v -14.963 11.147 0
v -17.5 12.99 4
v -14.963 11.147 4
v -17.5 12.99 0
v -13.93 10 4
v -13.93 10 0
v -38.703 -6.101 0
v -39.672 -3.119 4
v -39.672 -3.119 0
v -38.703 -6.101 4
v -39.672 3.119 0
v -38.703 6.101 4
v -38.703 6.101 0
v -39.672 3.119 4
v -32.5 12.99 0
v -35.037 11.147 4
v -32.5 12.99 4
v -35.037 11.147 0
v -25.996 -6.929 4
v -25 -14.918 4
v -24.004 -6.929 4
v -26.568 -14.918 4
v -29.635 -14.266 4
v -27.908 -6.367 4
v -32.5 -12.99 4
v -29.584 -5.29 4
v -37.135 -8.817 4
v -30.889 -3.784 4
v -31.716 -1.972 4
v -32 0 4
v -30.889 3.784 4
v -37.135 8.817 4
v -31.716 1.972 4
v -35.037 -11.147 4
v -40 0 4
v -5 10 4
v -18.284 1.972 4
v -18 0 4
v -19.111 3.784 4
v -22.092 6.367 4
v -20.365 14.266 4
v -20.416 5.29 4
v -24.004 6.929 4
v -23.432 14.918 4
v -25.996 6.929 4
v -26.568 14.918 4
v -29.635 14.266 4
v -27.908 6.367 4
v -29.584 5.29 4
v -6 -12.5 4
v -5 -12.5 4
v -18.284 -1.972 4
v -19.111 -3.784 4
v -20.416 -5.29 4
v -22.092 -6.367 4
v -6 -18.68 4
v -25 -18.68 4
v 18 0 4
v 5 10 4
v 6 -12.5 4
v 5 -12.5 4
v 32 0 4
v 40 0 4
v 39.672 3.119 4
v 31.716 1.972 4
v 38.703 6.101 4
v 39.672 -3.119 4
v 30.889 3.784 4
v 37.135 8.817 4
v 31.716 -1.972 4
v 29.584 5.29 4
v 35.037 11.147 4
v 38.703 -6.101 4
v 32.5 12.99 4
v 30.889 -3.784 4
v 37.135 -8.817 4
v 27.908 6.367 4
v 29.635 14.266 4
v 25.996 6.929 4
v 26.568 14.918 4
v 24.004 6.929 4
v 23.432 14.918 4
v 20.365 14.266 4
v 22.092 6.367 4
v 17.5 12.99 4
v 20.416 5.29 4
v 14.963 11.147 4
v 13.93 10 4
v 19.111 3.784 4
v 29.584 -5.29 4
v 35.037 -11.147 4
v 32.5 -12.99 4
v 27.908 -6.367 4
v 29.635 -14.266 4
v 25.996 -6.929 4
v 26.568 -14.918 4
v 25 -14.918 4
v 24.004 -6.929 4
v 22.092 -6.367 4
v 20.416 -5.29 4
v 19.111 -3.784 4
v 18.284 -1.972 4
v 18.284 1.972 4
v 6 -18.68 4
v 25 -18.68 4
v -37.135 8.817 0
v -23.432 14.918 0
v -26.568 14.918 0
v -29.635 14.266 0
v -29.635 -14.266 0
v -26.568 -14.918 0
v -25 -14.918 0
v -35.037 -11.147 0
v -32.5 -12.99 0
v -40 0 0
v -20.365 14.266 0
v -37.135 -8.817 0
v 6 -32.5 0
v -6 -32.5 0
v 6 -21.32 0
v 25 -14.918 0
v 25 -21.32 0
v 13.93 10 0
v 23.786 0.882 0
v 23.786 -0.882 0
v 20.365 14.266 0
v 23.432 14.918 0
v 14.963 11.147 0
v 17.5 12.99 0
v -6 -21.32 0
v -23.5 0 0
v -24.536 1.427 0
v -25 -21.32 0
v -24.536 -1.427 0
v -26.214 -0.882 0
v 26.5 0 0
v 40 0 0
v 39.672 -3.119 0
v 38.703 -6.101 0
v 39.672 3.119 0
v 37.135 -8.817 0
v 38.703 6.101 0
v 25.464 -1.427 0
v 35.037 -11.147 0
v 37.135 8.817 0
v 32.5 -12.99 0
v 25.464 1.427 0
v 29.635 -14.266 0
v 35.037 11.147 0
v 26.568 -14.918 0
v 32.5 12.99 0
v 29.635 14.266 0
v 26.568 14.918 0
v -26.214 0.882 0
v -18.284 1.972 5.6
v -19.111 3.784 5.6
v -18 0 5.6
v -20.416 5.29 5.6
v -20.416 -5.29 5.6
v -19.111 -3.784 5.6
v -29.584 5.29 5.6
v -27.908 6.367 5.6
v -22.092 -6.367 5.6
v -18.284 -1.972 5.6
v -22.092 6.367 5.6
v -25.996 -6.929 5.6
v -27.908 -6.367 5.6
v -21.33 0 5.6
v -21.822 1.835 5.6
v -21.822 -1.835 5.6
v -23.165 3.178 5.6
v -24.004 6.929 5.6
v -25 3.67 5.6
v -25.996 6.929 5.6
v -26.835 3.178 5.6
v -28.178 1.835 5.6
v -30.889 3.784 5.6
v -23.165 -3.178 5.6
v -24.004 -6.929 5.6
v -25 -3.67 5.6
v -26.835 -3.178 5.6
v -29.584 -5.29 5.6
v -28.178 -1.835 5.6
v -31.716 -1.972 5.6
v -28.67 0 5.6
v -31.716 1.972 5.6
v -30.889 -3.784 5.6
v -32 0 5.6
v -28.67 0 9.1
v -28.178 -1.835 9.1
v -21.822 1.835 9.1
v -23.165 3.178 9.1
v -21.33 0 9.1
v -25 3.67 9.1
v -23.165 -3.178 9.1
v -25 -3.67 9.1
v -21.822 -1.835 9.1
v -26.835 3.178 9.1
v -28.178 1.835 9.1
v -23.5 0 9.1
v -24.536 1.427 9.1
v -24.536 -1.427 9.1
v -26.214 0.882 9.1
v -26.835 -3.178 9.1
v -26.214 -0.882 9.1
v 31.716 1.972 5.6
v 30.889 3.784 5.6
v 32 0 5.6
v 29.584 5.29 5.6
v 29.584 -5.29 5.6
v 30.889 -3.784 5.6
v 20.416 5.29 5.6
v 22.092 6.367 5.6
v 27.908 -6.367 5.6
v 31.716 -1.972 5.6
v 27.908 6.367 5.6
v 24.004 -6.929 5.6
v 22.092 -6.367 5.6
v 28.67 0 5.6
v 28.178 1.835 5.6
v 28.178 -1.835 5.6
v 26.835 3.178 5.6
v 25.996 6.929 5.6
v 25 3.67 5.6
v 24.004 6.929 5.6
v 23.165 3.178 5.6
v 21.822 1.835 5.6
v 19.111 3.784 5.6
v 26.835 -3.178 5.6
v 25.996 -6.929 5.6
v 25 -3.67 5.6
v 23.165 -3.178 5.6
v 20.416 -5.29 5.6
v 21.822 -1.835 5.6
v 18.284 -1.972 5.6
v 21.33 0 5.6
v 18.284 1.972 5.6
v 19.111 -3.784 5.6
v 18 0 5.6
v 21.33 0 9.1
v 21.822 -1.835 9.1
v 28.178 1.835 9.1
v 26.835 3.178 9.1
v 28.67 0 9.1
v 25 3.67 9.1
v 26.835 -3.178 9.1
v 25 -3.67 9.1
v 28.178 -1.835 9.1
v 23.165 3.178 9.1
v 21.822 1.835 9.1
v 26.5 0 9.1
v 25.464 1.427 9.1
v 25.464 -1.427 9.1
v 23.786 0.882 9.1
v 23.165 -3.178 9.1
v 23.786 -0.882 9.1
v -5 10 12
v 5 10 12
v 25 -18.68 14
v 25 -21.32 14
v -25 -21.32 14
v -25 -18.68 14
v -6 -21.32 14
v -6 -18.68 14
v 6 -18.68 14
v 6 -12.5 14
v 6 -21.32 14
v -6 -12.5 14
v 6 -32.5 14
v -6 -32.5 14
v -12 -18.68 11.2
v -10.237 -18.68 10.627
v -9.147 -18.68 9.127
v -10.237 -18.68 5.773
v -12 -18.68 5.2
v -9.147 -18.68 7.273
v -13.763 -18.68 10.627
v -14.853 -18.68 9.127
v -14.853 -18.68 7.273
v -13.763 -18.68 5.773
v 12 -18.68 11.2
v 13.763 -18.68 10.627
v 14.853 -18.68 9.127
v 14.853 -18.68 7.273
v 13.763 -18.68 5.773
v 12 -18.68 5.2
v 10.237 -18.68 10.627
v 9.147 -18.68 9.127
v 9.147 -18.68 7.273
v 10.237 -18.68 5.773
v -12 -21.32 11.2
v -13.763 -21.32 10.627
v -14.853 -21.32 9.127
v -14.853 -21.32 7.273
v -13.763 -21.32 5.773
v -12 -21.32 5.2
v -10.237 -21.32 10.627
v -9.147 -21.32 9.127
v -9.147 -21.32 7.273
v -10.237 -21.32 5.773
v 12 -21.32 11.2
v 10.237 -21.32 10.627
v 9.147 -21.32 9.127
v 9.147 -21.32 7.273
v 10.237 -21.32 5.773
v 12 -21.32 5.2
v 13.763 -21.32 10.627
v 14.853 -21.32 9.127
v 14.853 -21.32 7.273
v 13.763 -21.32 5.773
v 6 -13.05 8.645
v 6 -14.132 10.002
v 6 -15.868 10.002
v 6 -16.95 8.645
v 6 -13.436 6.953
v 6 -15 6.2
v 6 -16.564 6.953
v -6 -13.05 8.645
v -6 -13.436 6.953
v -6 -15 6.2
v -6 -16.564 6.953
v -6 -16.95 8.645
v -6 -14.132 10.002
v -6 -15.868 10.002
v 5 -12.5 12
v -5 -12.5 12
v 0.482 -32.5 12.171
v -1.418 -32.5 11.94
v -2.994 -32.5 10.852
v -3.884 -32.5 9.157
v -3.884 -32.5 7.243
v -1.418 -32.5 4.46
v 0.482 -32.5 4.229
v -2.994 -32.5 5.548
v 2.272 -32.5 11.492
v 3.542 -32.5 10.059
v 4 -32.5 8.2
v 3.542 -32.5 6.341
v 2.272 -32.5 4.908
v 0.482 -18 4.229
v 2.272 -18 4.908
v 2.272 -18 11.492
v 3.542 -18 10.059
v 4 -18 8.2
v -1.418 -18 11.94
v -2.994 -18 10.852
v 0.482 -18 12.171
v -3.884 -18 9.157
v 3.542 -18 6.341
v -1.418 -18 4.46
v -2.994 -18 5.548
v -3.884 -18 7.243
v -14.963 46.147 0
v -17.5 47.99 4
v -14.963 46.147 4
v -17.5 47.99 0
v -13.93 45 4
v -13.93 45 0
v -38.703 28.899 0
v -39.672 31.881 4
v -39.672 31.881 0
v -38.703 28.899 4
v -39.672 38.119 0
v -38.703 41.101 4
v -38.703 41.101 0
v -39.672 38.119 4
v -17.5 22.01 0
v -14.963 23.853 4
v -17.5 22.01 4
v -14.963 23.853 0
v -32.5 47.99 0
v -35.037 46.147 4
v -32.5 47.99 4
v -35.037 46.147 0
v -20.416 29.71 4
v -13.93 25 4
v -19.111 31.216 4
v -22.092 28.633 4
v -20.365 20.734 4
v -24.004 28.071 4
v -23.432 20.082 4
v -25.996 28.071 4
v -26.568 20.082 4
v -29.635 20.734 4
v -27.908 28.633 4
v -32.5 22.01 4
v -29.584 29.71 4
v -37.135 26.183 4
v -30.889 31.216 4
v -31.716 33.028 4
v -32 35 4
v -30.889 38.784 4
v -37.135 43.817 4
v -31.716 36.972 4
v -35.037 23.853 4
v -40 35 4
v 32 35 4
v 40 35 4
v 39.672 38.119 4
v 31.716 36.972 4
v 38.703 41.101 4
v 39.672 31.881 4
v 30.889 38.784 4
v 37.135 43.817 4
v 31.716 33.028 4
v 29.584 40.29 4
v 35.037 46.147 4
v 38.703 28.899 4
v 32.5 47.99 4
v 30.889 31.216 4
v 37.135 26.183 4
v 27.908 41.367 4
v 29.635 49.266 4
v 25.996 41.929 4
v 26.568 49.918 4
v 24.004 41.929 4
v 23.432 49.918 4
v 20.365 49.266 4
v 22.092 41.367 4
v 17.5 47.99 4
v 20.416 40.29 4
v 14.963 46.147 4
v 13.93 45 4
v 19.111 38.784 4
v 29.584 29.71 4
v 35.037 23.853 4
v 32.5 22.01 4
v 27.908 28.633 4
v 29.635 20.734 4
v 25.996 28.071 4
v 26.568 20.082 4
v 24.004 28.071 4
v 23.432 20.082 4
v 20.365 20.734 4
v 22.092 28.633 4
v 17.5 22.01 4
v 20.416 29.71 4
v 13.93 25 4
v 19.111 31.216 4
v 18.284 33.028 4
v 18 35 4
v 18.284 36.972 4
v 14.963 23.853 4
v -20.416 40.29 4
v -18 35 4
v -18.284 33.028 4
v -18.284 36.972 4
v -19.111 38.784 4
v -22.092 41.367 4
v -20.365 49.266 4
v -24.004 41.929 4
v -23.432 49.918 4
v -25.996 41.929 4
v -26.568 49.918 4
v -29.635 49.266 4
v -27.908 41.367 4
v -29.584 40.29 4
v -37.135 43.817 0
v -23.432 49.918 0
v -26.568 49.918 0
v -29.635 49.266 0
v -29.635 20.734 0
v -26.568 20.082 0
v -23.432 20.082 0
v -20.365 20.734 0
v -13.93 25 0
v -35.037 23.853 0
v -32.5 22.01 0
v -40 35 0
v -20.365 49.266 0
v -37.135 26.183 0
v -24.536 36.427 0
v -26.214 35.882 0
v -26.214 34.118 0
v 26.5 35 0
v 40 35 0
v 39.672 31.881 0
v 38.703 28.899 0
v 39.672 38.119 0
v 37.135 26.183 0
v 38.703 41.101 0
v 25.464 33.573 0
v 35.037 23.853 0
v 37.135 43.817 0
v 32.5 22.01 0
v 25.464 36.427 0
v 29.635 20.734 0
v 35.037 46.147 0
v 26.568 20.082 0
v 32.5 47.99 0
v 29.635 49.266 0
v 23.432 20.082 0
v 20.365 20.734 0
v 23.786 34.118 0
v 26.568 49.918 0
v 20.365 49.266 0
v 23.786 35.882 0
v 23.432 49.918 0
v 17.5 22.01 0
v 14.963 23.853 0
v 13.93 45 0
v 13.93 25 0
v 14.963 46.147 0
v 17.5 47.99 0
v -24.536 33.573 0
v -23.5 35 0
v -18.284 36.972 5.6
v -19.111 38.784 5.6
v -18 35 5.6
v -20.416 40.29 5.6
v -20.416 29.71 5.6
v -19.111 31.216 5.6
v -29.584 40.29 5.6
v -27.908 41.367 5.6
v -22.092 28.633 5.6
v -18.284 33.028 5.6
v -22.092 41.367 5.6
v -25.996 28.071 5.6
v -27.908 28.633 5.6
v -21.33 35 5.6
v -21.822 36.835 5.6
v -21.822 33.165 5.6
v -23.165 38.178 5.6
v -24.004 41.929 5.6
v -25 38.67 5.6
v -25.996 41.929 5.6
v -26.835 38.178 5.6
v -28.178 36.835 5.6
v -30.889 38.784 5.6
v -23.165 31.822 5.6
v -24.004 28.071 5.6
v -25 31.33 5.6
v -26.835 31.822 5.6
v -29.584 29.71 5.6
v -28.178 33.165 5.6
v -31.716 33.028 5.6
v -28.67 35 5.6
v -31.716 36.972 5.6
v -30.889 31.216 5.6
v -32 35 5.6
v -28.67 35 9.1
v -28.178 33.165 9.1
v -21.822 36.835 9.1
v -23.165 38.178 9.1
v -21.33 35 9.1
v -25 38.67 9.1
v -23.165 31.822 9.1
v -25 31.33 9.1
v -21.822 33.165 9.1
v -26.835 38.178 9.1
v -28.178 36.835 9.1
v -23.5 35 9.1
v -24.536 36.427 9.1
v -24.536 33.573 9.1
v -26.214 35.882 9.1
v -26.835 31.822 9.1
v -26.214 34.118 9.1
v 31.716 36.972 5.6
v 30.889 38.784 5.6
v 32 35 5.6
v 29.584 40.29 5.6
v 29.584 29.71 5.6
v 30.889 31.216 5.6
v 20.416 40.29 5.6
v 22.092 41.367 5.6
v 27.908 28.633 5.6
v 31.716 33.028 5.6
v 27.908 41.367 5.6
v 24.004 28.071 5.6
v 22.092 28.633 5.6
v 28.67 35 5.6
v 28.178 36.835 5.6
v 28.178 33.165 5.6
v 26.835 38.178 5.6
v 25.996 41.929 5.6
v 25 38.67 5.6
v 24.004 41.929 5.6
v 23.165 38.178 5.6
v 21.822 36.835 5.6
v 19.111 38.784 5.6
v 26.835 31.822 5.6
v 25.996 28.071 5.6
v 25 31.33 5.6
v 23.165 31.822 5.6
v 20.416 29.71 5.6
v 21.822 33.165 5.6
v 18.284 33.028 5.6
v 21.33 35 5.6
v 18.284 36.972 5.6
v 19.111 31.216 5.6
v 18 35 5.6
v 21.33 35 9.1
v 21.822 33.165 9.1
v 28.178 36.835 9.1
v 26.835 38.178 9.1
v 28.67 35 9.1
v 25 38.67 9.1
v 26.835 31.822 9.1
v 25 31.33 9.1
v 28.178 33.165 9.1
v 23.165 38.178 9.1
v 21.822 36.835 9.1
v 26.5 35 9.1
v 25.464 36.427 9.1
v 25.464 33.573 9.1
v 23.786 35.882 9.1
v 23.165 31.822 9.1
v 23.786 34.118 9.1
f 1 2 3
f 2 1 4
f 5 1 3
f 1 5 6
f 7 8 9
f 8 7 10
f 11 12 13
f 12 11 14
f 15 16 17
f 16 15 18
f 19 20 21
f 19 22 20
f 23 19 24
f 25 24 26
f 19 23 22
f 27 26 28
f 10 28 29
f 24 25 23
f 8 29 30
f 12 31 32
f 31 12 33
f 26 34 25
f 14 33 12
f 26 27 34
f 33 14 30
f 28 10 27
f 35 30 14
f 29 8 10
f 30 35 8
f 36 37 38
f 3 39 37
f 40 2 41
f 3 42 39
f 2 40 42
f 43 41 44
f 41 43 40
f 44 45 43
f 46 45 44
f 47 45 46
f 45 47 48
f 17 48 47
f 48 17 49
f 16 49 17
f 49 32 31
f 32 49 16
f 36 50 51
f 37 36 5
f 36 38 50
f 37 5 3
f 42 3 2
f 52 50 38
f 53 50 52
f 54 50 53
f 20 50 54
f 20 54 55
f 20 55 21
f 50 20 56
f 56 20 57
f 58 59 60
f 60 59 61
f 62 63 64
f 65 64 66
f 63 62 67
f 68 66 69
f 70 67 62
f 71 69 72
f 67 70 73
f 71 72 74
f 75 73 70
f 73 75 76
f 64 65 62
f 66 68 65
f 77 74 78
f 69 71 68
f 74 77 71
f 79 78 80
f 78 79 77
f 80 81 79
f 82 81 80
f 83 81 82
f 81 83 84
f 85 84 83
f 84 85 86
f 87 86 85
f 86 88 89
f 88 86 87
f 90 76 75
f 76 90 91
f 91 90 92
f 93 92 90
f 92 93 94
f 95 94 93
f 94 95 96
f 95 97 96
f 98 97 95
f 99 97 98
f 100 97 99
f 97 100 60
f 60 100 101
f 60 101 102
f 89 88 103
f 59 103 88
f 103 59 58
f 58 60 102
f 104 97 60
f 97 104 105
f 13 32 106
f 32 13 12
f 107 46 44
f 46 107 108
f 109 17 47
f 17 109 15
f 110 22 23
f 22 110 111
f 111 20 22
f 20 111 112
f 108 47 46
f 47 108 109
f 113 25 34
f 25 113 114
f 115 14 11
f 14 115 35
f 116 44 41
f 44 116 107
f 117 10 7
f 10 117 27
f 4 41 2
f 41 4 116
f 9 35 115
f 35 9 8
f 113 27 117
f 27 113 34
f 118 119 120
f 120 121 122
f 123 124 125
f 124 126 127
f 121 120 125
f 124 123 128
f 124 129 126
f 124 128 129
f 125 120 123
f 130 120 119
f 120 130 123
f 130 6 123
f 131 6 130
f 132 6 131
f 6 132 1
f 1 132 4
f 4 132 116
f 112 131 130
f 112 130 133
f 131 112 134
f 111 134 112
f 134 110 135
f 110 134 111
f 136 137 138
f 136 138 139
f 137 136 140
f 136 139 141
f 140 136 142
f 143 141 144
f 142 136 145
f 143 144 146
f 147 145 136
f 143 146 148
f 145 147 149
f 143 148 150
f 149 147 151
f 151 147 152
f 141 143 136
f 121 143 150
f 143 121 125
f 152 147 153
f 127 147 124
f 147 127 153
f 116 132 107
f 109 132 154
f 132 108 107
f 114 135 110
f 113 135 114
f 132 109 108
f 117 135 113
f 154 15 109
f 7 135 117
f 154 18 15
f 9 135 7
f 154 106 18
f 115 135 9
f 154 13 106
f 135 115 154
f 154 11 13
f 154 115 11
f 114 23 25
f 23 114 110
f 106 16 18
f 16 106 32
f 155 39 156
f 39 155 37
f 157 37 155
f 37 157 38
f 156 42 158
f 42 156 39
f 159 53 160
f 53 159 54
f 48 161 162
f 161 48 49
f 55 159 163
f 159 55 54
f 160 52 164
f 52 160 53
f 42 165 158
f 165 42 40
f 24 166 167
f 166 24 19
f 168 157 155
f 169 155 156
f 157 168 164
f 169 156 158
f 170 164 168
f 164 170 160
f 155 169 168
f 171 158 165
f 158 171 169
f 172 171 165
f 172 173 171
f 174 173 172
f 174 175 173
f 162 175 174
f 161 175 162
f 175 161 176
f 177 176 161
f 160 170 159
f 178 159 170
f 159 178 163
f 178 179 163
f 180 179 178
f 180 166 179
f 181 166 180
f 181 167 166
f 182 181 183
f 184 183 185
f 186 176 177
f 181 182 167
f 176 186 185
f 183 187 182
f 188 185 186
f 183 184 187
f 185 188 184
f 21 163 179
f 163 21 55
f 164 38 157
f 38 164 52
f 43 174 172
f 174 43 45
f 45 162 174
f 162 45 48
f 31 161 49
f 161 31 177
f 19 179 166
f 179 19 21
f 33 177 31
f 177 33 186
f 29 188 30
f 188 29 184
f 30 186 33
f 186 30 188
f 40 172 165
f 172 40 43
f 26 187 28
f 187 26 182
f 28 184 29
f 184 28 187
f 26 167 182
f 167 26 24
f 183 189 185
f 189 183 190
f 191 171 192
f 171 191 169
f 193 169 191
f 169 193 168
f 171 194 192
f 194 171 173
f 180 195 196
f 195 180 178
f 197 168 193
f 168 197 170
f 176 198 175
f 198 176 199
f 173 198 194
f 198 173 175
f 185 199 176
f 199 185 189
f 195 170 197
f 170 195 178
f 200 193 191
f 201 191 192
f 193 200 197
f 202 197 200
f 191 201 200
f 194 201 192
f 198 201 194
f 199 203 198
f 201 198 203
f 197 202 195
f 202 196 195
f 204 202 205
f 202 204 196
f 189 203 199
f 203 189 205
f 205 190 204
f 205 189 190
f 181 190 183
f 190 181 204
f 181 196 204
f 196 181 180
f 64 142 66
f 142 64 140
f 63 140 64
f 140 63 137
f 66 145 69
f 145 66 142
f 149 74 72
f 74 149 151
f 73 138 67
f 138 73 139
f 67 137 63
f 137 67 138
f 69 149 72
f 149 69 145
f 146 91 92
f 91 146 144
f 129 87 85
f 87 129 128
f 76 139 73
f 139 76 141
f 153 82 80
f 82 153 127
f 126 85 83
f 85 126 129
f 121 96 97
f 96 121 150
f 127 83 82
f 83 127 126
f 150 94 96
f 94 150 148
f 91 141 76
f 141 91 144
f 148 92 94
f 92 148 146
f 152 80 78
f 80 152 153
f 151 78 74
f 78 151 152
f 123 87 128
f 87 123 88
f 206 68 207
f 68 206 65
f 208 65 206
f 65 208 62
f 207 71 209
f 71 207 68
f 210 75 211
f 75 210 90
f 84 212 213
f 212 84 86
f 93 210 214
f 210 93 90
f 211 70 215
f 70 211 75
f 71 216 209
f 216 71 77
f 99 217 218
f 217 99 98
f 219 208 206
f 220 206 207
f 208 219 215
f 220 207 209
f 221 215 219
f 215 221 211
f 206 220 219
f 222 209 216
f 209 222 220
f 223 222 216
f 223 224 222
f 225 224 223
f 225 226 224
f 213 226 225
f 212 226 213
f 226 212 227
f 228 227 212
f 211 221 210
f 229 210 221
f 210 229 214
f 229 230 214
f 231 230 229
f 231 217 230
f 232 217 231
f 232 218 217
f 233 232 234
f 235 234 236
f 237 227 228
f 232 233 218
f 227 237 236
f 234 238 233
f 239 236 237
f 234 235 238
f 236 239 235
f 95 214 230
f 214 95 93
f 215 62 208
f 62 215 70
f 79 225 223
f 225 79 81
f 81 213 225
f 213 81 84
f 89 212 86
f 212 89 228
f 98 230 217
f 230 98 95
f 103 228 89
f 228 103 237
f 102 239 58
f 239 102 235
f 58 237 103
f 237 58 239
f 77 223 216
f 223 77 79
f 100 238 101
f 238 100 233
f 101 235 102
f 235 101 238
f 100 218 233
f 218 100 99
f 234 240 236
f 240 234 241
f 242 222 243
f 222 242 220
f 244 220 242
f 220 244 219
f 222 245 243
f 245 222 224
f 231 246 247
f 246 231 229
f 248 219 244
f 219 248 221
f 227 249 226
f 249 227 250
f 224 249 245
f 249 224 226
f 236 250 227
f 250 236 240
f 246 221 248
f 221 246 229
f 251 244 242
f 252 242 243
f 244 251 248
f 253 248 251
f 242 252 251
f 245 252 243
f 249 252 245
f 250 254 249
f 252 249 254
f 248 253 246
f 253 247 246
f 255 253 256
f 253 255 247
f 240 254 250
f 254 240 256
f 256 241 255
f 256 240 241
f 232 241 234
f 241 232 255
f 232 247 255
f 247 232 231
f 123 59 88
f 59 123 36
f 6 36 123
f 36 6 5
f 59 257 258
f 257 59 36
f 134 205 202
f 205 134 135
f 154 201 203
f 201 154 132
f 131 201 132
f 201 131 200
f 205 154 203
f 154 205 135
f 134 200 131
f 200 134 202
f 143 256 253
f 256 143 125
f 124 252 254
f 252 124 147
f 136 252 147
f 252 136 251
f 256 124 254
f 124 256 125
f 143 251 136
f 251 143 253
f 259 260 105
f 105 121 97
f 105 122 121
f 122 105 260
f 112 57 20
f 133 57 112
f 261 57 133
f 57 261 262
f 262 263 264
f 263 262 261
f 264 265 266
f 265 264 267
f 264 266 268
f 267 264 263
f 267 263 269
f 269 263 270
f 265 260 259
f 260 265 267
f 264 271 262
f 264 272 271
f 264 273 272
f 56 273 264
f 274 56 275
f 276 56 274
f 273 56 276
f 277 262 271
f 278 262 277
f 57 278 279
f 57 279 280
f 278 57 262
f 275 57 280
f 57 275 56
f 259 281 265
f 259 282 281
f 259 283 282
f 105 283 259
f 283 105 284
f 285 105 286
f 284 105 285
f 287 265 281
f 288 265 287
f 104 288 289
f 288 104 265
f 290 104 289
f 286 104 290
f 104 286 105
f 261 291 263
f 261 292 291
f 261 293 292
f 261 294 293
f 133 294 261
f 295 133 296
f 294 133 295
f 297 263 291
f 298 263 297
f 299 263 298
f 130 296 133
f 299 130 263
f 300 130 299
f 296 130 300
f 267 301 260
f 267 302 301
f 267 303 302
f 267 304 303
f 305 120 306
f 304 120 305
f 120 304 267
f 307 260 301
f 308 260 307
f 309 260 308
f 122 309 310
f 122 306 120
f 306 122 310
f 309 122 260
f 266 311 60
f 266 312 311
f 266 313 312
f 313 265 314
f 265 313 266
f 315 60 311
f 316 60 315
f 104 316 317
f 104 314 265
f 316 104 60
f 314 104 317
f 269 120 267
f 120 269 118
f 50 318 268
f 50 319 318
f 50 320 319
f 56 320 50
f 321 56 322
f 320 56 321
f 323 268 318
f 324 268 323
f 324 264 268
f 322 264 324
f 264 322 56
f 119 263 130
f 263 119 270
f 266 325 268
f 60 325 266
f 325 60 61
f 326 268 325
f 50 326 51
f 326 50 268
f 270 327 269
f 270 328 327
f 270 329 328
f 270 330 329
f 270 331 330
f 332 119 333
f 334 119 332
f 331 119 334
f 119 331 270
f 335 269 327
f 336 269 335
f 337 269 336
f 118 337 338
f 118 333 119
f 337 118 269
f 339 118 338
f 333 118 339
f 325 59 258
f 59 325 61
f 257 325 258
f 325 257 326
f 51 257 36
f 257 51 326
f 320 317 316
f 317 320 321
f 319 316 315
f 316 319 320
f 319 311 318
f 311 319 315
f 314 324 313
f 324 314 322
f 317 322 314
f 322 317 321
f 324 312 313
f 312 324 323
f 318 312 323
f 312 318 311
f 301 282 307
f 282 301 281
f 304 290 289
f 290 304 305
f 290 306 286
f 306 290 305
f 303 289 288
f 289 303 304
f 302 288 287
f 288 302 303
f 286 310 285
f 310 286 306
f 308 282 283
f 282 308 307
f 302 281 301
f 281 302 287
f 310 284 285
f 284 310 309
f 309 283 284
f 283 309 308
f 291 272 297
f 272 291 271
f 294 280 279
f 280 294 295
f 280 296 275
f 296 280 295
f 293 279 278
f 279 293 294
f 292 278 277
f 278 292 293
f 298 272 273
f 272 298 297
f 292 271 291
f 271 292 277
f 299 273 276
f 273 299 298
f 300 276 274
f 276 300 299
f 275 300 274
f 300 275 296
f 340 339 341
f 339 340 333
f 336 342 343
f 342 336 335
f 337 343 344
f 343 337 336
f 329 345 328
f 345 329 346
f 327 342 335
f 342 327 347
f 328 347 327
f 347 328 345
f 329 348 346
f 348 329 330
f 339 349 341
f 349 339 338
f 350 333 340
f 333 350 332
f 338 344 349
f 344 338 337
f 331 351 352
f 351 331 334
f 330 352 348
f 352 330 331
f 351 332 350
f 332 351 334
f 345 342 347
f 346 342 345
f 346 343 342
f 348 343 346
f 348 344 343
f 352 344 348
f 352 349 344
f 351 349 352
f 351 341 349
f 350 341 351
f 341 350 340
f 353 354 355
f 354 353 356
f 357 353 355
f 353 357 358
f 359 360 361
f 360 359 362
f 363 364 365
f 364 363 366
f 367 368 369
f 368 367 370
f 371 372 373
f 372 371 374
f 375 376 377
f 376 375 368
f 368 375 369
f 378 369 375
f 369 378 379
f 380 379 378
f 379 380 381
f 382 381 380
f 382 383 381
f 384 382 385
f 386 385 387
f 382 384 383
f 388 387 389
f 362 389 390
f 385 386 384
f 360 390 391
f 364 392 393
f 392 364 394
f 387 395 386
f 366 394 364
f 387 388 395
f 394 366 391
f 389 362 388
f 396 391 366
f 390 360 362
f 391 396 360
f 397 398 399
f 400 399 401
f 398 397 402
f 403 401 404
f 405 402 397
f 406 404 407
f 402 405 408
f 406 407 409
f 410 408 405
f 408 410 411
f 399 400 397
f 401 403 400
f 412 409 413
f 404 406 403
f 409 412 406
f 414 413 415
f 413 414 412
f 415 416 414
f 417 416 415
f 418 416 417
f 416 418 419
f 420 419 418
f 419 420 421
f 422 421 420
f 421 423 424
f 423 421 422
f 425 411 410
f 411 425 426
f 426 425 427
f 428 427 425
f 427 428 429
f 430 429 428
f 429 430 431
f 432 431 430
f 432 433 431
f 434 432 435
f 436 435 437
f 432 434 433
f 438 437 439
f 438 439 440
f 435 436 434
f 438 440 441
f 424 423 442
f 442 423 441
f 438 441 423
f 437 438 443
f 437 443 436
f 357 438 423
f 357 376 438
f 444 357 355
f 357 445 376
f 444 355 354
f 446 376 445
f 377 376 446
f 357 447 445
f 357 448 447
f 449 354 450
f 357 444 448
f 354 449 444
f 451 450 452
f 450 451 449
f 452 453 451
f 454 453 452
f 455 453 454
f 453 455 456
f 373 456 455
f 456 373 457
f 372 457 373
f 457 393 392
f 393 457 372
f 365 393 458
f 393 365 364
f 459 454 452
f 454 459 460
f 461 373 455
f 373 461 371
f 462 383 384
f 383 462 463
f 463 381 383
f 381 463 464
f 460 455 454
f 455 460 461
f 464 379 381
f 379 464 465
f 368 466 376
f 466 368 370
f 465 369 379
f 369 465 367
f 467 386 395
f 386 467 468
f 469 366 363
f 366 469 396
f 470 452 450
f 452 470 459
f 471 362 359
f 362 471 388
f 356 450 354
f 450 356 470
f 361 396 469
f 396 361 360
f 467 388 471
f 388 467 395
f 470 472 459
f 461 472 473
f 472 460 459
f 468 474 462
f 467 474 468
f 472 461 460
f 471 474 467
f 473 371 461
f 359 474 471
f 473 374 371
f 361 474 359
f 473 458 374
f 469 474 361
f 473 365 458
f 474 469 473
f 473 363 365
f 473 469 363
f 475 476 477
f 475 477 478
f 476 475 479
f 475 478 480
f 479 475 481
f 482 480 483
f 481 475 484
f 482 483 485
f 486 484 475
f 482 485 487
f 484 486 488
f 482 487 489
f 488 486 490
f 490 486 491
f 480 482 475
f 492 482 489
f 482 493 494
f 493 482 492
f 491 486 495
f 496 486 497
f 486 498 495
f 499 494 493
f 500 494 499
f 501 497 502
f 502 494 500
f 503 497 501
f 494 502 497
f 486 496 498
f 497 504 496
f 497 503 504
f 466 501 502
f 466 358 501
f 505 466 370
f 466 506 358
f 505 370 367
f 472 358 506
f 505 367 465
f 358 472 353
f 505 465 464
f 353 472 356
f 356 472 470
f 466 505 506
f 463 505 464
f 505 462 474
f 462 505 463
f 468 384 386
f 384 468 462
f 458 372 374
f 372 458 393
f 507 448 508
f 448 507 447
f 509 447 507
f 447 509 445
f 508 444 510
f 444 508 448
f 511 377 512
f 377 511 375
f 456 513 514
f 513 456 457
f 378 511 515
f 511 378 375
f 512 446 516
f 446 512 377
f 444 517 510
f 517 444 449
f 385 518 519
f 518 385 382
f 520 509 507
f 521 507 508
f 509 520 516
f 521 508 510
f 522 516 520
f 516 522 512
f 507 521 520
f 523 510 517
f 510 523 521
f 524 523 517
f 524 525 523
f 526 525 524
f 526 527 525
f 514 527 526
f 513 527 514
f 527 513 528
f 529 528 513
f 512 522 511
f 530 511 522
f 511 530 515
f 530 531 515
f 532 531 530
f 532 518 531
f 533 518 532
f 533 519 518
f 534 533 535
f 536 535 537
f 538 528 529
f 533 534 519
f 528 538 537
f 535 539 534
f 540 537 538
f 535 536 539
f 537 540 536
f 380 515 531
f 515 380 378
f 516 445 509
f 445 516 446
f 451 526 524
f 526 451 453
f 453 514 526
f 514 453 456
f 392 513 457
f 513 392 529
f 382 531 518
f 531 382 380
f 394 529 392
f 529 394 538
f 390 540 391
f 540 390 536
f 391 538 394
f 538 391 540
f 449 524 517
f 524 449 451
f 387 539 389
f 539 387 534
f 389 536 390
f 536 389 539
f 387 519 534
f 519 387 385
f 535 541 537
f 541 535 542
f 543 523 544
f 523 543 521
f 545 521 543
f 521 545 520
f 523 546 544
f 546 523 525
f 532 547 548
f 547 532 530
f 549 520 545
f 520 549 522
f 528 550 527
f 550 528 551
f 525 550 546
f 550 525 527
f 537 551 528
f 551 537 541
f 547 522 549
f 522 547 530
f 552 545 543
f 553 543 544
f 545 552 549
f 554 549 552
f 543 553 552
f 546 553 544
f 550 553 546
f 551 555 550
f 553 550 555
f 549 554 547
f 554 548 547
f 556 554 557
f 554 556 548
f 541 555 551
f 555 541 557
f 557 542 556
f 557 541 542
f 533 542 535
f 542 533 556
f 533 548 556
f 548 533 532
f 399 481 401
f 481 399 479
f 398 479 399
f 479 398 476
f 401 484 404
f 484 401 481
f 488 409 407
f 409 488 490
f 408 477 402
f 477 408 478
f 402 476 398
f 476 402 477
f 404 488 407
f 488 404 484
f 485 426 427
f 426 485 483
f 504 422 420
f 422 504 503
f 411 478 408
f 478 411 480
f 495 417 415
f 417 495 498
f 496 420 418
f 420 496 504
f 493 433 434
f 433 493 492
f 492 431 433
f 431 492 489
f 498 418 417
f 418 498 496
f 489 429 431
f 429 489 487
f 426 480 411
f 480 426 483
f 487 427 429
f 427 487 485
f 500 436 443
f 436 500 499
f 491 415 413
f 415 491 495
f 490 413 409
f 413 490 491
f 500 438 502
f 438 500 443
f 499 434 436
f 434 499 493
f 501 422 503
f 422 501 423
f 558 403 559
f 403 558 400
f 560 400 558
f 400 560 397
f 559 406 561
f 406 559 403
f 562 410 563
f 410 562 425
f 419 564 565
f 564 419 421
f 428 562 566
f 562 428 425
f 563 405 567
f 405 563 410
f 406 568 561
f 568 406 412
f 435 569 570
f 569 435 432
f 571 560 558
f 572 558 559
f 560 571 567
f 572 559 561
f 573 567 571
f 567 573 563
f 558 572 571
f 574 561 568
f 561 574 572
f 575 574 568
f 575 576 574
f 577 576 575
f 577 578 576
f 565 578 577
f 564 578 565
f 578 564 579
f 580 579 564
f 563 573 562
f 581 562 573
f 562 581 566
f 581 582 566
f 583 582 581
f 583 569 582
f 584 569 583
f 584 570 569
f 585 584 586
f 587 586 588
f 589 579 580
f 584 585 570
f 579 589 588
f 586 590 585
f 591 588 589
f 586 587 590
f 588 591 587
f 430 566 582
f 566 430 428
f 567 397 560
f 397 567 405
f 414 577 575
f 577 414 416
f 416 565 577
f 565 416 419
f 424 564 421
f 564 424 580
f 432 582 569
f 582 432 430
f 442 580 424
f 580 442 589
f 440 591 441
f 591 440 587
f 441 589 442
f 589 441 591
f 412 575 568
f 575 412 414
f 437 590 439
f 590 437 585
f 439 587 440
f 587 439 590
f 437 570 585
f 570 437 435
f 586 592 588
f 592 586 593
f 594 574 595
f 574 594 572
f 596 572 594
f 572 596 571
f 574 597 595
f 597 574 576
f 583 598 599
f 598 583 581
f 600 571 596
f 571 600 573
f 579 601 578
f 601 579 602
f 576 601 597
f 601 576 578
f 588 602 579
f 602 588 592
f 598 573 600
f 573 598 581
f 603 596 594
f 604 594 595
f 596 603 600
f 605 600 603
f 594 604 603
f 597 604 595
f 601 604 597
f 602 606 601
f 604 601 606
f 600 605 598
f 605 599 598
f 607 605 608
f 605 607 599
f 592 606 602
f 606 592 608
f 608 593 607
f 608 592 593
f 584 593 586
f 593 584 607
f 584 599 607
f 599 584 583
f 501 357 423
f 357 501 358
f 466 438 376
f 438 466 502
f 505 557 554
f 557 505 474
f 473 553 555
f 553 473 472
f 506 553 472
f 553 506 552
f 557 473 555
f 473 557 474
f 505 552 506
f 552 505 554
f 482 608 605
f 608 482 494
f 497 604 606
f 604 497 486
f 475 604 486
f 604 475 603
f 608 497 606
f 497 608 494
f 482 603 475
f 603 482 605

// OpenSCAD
// file: drive-pulley.scad
// Drive pulley
// GNU GPL v3
// Václav 'ax' Hůla <axtheb@gmail.com>
// this is really just string guide with few touches. 
// TODO: refactor

include <configuration.scad>

guide_height = 7;

offset=0.47;

// thickness of the ring in thinnest part
wall_min_thickness = 14 - shaft_radius;
// outer (max) thickness of the ring
wall_max_thickness = wall_min_thickness + offset * guide_height;

module drive_pulley()
{
    difference()
    {
        union(){
            cylinder(r = shaft_radius + wall_min_thickness, h = guide_height);
            cylinder(r1 = shaft_radius + wall_max_thickness, r2 = shaft_radius + wall_min_thickness, h = guide_height * offset);
            translate([0, 0, guide_height * (1 - offset)])
                cylinder(r2 = shaft_radius + wall_max_thickness, r1 = shaft_radius + wall_min_thickness, h = guide_height * offset);
        }
        translate([0, 0, -1])
            cylinder(r = shaft_radius, h = guide_height + 2);  // putting low $fn may be good idea to assure nice press-fit
    }
}

pulley_spacing = 3 + 2 * (shaft_radius + wall_max_thickness);

for(i = [0:1]) {
    translate ([i * pulley_spacing, 0, 0]) drive_pulley();
}
// file: string-guide.scad
// String guide / idler
// GNU GPL v3
// Václav 'ax' Hůla <axtheb@gmail.com>
// Based on Greg Frosts bearing guide and Josef Prusas printable bearing.

include <configuration.scad>

guide_height = 7 + descent_thickness;

// thickness of the ring in thinnest part
wall_min_thickness = single_wall_width * 3;
// outer (max) thickness of the ring
wall_max_thickness = wall_min_thickness + 3;
wall_descent = 1;

module string_guide(offset=0.5)
{
    difference()
    {
        union(){
            cylinder(r1 = bearing_radius + wall_max_thickness, r2 = bearing_radius + wall_min_thickness, h = guide_height * offset);
            translate([0, 0, guide_height * offset])
                cylinder(r2 = bearing_radius + wall_max_thickness, r1 = bearing_radius + wall_min_thickness, h = guide_height * (1 - offset));
        }
        translate([0, 0, -1])
            cylinder(r = bearing_radius, h = guide_height + 2);  // putting low $fn may be good idea to assure nice press-fit
    }

    difference()  // flat part inside
    {
        cylinder(r = bearing_radius, h = descent_thickness);
        translate([0, 0, -1])
            cylinder(r = bearing_radius - wall_descent, h = descent_thickness + 2);
    }

}

guide_spacing = 3 + 2 * (bearing_radius + wall_max_thickness);

// there are two idlers with guide in middle, for far inner corners
for(i = [0:1]) {
    translate ([i * guide_spacing, 0, 0]) string_guide();
}
// three idlers with high guide for left side
for(i = [0:2]) {
    translate([i * guide_spacing, guide_spacing, 0]) string_guide(0.35);
}
// three idlers with low guide for right side
for(i = [0:2]) {
    translate([i * guide_spacing, -guide_spacing, 0]) string_guide(0.65);
}
// file: configuration.scad
// printer properties
layer_height = 0.3;
single_wall_width = layer_height * 2.2;

// bot part properties
bearing_radius = 11;
shaft_radius = 2.5;
descent_thickness = 2 * layer_height;
base_height = 4;

module base_with_holes(r=15) {
    difference() {
        cylinder(h=base_height, r2=15, r1=15 + base_height);
        for (angle = [0:17]) {
            rotate([0, 0, angle*20]) {
                translate([16, 0, -1]) rotate([0, 0, 180]) cylinder(r=1, h=base_height+2);
            }
        }
    }
}

// common funcions here
module bearing_base(holes=false) {
    if (holes) {
        base_with_holes();
    } else {
        cylinder(h=base_height, r=15);
    }
    cylinder(h=base_height + descent_thickness + 1, r=7);
    cylinder(h=base_height + descent_thickness + 4.5, r=(8 - single_wall_width) / 2);
}

module bearing_bed(dist=50, holes=false){
    difference() {
        union() {
            translate([-dist/2,0,0]) {
                bearing_base(holes=holes);
            }
            translate([dist/2,0,0]) {
                bearing_base(holes=holes);
            }
            translate([0, 0, base_height / 2]) cube([30, 20, base_height], center = true);
        }

        translate([-dist/2,0,-1]) cylinder(r=1.5, h=30);
        translate([dist/2,0,-1]) cylinder(r=1.5, h=30);
    }
}
// main file
// Side holder
// GNU GPL v3
// Václav 'ax' Hůla <axtheb@gmail.com>

include <configuration.scad>

use <string-guide.scad>
use <drive-pulley.scad>

%translate ([70, -1, base_height + 0.2])
{
drive_pulley();
// inner wire shadow (that goes to inner far pulley)
translate([0, -14, 4]) rotate([0, 90, 0]) cylinder(r = 0.2, h = 1000, center = true);
// outer wire shadow (which goes around string guide placed in this part and to the carriage
translate([0, 14, 3]) rotate([0, 90, 0]) cylinder(r = 0.2, h = 100, center = true);
}


%translate ([25, 0, base_height + 0.2]) {
string_guide(0.35);
// wire to the carriage
translate([-13, 14 - 50, 4]) rotate([0, 90, 90]) cylinder(r = 0.2, h = 100, center = true);
}

%mirror([1,0,0]) translate ([25, 0, base_height + 0.2]) {
string_guide(0.35);
// wire to the carriage
translate([-13, 14 - 50, 4]) rotate([0, 90, 90]) cylinder(r = 0.2, h = 100, center = true);
}

// distance rod
%translate([0, -518, base_height + 4.2]) rotate([90, 0, 0]) cylinder(r=4, h=1000, center = true);


// *-*-*-*-*-*-*-*-*-*- real part starts here -*-*-*-*-*-*-*-*-*-*

difference() {
    union() {

        // base
        translate([0, -14, base_height / 2]) cube([50, 10, base_height], center = true);
        bearing_bed();

        // face to carriage
        translate([0,-20,5 + base_height / 2]) cube([50, 4 * single_wall_width, 10 + base_height], center = true);

        // this holds distance rod
        translate([0,-22.5,5 + base_height / 2]) cube([12, 20, 10 + base_height], center = true);
        translate([0,-10,4 + base_height / 2]) cube([10, 40, 8 + base_height], center = true);
    }


    union() {
        // passthru wire
        translate([0, -15, base_height + 4.2]) rotate([0, 90, 0]) cylinder(r = 2, h = 100, center = true);
        // wires to carriage
        translate([12, 0, base_height + 4.2]) rotate([0, 90, 90])  cylinder(r = 3, h = 100, center = true);
        translate([-12, 0, base_height + 4.2]) rotate([0, 90, 90]) cylinder(r = 3, h = 100, center = true);
        // distance rod
        translate([0, -28, base_height + 4.2]) rotate([90, 0, 0]) cylinder(r=4, h=20, center = true);
    }

    translate([-25,0,-1]) cylinder(r=1.5, h=30);
    translate([25,0,-1]) cylinder(r=1.5, h=30);
}


translate([0,35,0]) {
    bearing_bed();
}
